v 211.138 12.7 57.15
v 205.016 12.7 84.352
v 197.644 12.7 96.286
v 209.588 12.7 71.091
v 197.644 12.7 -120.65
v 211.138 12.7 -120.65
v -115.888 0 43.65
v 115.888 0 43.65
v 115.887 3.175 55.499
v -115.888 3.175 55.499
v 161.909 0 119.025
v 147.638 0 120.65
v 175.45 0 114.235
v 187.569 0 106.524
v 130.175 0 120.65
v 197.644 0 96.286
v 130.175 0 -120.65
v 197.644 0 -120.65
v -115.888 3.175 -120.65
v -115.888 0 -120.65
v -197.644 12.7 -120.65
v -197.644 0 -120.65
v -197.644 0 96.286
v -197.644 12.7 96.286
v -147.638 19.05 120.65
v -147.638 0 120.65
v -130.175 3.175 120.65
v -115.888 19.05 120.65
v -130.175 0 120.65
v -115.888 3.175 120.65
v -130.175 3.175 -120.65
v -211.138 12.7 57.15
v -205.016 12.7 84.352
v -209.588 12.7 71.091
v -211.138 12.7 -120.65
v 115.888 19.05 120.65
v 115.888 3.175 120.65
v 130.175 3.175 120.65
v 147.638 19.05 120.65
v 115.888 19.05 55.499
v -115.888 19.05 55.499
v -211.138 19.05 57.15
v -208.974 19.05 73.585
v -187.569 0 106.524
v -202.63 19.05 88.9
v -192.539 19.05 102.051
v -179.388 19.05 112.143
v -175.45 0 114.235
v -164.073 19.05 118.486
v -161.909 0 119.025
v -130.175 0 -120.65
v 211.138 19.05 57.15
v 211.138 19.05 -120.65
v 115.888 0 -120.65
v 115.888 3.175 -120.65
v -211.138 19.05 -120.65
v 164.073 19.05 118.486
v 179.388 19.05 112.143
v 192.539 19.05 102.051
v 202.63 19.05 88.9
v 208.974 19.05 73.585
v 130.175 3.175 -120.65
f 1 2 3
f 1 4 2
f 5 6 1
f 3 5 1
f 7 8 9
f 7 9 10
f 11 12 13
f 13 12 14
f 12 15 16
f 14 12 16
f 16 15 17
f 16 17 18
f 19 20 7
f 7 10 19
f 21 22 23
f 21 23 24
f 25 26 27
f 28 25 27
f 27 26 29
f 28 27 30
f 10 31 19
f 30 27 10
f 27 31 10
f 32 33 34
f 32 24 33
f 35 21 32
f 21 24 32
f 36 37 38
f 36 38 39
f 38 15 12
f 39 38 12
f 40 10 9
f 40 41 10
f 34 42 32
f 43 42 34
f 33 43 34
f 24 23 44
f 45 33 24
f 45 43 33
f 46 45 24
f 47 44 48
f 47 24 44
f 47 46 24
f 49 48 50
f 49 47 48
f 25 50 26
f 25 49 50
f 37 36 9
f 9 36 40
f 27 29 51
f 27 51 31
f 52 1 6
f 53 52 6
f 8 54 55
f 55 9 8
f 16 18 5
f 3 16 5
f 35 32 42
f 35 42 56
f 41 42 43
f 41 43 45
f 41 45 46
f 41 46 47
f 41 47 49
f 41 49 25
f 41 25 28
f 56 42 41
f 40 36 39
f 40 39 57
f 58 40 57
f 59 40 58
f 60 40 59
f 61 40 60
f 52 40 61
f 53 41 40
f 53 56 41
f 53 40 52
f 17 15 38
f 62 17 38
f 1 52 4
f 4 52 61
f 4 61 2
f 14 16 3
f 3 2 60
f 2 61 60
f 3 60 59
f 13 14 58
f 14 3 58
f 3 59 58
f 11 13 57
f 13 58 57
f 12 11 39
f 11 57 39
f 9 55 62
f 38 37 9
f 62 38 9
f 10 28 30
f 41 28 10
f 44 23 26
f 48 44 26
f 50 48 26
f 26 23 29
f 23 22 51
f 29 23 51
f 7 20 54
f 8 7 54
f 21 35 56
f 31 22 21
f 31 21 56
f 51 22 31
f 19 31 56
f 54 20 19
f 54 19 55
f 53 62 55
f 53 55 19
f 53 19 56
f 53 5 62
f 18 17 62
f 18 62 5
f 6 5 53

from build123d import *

# Parameters (mm, degrees)
SKETCH1_W           = 422.275
SKETCH1_H           = 241.3
BOSS_EXTRUDE1_DEPTH = 19.05
CUT_EXTRUDE1_REACH  = 245.923
SKETCH2_W           = 231.775
SKETCH2_H           = 65.151
CUT_EXTRUDE2_REACH  = 323.197
SKETCH3_W           = 14.2875
SKETCH3_H           = 3.175
CUT_EXTRUDE3_REACH  = 323.197
SKETCH4_W           = 13.49375
SKETCH4_H           = 3.175
FILLET1_R           = 63.5
CUT_EXTRUDE4_REACH  = 323.197
SKETCH5_W           = 13.49375
SKETCH5_H           = 9.525
CHAMFER1_SIZE       = 3.175
CHAMFER1_SIZE2      = 11.849261314


with BuildPart() as part:
    # Sketch1 → Boss-Extrude1 (new body)
    with BuildSketch(Plane(origin=(0, 0, 0), x_dir=(1, 0, 0), z_dir=(0, 1, 0))):
        Rectangle(SKETCH1_W, SKETCH1_H)
    extrude(amount=BOSS_EXTRUDE1_DEPTH)

    # Sketch2 → Cut-Extrude1 (cut, up to next)
    with BuildSketch(Plane(origin=(0, 19.05, 0), x_dir=(1, 0, 0), z_dir=(0, 1, 0)), mode=Mode.PRIVATE) as cut_extrude1_sk1:
        with Locations((0, -88.0745)):
            Rectangle(SKETCH2_W, SKETCH2_H)
    cut_extrude1_tool1 = extrude(cut_extrude1_sk1.sketch, amount=-CUT_EXTRUDE1_REACH, mode=Mode.PRIVATE) & part.part
    add(cut_extrude1_tool1.solids().sort_by_distance((0, 19.05, 88.0745))[0], mode=Mode.SUBTRACT)

    # Sketch3 → Cut-Extrude2 (cut, up to next)
    with BuildSketch(Plane.XY.offset(120.65), mode=Mode.PRIVATE) as cut_extrude2_sk1:
        with Locations((-123.03125, 1.5875)):
            Rectangle(SKETCH3_W, SKETCH3_H)
    cut_extrude2_tool1 = extrude(cut_extrude2_sk1.sketch, amount=-CUT_EXTRUDE2_REACH, mode=Mode.PRIVATE) & part.part
    # Sketch3 → Cut-Extrude2 (cut, up to next)
    with BuildSketch(Plane.XY.offset(120.65), mode=Mode.PRIVATE) as cut_extrude2_sk2:
        with Locations((123.03125, 1.5875)):
            Rectangle(SKETCH3_W, SKETCH3_H)
    cut_extrude2_tool2 = extrude(cut_extrude2_sk2.sketch, amount=-CUT_EXTRUDE2_REACH, mode=Mode.PRIVATE) & part.part
    add(cut_extrude2_tool1.solids().sort_by_distance((-123.03125, 1.5875, 120.65))[0], mode=Mode.SUBTRACT)
    add(cut_extrude2_tool2.solids().sort_by_distance((123.03125, 1.5875, 120.65))[0], mode=Mode.SUBTRACT)

    # Sketch4 → Cut-Extrude3 (cut, up to next)
    with BuildSketch(Plane.XY.offset(120.65), mode=Mode.PRIVATE) as cut_extrude3_sk1:
        with Locations((-204.390625, 1.5875)):
            Rectangle(SKETCH4_W, SKETCH4_H)
    cut_extrude3_tool1 = extrude(cut_extrude3_sk1.sketch, amount=-CUT_EXTRUDE3_REACH, mode=Mode.PRIVATE) & part.part
    # Sketch4 → Cut-Extrude3 (cut, up to next)
    with BuildSketch(Plane.XY.offset(120.65), mode=Mode.PRIVATE) as cut_extrude3_sk2:
        with Locations((204.390625, 1.5875)):
            Rectangle(SKETCH4_W, SKETCH4_H)
    cut_extrude3_tool2 = extrude(cut_extrude3_sk2.sketch, amount=-CUT_EXTRUDE3_REACH, mode=Mode.PRIVATE) & part.part
    add(cut_extrude3_tool1.solids().sort_by_distance((-204.390625, 1.5875, 120.65))[0], mode=Mode.SUBTRACT)
    add(cut_extrude3_tool2.solids().sort_by_distance((204.390625, 1.5875, 120.65))[0], mode=Mode.SUBTRACT)

    # Fillet1
    fillet1_edges = [part.edges().sort_by_distance(p)[0] for p in [
        (211.1375, 11.1125, 120.65),
        (-211.1375, 11.1125, 120.65),
    ]]
    fillet(fillet1_edges, radius=FILLET1_R)

    # Sketch5 → Cut-Extrude4 (cut, up to next)
    with BuildSketch(Plane(origin=(0, 0, -120.65), x_dir=(-1, 0, 0), z_dir=(0, 0, -1)), mode=Mode.PRIVATE) as cut_extrude4_sk1:
        with Locations((-204.390625, 7.9375)):
            Rectangle(SKETCH5_W, SKETCH5_H)
    cut_extrude4_tool1 = extrude(cut_extrude4_sk1.sketch, amount=-CUT_EXTRUDE4_REACH, mode=Mode.PRIVATE) & part.part
    # Sketch5 → Cut-Extrude4 (cut, up to next)
    with BuildSketch(Plane(origin=(0, 0, -120.65), x_dir=(-1, 0, 0), z_dir=(0, 0, -1)), mode=Mode.PRIVATE) as cut_extrude4_sk2:
        with Locations((204.390625, 7.9375)):
            Rectangle(SKETCH5_W, SKETCH5_H)
    cut_extrude4_tool2 = extrude(cut_extrude4_sk2.sketch, amount=-CUT_EXTRUDE4_REACH, mode=Mode.PRIVATE) & part.part
    add(cut_extrude4_tool1.solids().sort_by_distance((204.390625, 7.9375, -120.65))[0], mode=Mode.SUBTRACT)
    add(cut_extrude4_tool2.solids().sort_by_distance((-204.390625, 7.9375, -120.65))[0], mode=Mode.SUBTRACT)

    # Chamfer1
    chamfer1_edges = [part.edges().sort_by_distance(p)[0] for p in [
        (0, 0, 55.499),
    ]]
    chamfer1_side = [part.faces().sort_by_distance(p)[0] for p in [
        (0, 9.525, 55.499),
    ]]
    chamfer(chamfer1_edges, length=CHAMFER1_SIZE, length2=CHAMFER1_SIZE2, reference=chamfer1_side[0])


solid = part.part
